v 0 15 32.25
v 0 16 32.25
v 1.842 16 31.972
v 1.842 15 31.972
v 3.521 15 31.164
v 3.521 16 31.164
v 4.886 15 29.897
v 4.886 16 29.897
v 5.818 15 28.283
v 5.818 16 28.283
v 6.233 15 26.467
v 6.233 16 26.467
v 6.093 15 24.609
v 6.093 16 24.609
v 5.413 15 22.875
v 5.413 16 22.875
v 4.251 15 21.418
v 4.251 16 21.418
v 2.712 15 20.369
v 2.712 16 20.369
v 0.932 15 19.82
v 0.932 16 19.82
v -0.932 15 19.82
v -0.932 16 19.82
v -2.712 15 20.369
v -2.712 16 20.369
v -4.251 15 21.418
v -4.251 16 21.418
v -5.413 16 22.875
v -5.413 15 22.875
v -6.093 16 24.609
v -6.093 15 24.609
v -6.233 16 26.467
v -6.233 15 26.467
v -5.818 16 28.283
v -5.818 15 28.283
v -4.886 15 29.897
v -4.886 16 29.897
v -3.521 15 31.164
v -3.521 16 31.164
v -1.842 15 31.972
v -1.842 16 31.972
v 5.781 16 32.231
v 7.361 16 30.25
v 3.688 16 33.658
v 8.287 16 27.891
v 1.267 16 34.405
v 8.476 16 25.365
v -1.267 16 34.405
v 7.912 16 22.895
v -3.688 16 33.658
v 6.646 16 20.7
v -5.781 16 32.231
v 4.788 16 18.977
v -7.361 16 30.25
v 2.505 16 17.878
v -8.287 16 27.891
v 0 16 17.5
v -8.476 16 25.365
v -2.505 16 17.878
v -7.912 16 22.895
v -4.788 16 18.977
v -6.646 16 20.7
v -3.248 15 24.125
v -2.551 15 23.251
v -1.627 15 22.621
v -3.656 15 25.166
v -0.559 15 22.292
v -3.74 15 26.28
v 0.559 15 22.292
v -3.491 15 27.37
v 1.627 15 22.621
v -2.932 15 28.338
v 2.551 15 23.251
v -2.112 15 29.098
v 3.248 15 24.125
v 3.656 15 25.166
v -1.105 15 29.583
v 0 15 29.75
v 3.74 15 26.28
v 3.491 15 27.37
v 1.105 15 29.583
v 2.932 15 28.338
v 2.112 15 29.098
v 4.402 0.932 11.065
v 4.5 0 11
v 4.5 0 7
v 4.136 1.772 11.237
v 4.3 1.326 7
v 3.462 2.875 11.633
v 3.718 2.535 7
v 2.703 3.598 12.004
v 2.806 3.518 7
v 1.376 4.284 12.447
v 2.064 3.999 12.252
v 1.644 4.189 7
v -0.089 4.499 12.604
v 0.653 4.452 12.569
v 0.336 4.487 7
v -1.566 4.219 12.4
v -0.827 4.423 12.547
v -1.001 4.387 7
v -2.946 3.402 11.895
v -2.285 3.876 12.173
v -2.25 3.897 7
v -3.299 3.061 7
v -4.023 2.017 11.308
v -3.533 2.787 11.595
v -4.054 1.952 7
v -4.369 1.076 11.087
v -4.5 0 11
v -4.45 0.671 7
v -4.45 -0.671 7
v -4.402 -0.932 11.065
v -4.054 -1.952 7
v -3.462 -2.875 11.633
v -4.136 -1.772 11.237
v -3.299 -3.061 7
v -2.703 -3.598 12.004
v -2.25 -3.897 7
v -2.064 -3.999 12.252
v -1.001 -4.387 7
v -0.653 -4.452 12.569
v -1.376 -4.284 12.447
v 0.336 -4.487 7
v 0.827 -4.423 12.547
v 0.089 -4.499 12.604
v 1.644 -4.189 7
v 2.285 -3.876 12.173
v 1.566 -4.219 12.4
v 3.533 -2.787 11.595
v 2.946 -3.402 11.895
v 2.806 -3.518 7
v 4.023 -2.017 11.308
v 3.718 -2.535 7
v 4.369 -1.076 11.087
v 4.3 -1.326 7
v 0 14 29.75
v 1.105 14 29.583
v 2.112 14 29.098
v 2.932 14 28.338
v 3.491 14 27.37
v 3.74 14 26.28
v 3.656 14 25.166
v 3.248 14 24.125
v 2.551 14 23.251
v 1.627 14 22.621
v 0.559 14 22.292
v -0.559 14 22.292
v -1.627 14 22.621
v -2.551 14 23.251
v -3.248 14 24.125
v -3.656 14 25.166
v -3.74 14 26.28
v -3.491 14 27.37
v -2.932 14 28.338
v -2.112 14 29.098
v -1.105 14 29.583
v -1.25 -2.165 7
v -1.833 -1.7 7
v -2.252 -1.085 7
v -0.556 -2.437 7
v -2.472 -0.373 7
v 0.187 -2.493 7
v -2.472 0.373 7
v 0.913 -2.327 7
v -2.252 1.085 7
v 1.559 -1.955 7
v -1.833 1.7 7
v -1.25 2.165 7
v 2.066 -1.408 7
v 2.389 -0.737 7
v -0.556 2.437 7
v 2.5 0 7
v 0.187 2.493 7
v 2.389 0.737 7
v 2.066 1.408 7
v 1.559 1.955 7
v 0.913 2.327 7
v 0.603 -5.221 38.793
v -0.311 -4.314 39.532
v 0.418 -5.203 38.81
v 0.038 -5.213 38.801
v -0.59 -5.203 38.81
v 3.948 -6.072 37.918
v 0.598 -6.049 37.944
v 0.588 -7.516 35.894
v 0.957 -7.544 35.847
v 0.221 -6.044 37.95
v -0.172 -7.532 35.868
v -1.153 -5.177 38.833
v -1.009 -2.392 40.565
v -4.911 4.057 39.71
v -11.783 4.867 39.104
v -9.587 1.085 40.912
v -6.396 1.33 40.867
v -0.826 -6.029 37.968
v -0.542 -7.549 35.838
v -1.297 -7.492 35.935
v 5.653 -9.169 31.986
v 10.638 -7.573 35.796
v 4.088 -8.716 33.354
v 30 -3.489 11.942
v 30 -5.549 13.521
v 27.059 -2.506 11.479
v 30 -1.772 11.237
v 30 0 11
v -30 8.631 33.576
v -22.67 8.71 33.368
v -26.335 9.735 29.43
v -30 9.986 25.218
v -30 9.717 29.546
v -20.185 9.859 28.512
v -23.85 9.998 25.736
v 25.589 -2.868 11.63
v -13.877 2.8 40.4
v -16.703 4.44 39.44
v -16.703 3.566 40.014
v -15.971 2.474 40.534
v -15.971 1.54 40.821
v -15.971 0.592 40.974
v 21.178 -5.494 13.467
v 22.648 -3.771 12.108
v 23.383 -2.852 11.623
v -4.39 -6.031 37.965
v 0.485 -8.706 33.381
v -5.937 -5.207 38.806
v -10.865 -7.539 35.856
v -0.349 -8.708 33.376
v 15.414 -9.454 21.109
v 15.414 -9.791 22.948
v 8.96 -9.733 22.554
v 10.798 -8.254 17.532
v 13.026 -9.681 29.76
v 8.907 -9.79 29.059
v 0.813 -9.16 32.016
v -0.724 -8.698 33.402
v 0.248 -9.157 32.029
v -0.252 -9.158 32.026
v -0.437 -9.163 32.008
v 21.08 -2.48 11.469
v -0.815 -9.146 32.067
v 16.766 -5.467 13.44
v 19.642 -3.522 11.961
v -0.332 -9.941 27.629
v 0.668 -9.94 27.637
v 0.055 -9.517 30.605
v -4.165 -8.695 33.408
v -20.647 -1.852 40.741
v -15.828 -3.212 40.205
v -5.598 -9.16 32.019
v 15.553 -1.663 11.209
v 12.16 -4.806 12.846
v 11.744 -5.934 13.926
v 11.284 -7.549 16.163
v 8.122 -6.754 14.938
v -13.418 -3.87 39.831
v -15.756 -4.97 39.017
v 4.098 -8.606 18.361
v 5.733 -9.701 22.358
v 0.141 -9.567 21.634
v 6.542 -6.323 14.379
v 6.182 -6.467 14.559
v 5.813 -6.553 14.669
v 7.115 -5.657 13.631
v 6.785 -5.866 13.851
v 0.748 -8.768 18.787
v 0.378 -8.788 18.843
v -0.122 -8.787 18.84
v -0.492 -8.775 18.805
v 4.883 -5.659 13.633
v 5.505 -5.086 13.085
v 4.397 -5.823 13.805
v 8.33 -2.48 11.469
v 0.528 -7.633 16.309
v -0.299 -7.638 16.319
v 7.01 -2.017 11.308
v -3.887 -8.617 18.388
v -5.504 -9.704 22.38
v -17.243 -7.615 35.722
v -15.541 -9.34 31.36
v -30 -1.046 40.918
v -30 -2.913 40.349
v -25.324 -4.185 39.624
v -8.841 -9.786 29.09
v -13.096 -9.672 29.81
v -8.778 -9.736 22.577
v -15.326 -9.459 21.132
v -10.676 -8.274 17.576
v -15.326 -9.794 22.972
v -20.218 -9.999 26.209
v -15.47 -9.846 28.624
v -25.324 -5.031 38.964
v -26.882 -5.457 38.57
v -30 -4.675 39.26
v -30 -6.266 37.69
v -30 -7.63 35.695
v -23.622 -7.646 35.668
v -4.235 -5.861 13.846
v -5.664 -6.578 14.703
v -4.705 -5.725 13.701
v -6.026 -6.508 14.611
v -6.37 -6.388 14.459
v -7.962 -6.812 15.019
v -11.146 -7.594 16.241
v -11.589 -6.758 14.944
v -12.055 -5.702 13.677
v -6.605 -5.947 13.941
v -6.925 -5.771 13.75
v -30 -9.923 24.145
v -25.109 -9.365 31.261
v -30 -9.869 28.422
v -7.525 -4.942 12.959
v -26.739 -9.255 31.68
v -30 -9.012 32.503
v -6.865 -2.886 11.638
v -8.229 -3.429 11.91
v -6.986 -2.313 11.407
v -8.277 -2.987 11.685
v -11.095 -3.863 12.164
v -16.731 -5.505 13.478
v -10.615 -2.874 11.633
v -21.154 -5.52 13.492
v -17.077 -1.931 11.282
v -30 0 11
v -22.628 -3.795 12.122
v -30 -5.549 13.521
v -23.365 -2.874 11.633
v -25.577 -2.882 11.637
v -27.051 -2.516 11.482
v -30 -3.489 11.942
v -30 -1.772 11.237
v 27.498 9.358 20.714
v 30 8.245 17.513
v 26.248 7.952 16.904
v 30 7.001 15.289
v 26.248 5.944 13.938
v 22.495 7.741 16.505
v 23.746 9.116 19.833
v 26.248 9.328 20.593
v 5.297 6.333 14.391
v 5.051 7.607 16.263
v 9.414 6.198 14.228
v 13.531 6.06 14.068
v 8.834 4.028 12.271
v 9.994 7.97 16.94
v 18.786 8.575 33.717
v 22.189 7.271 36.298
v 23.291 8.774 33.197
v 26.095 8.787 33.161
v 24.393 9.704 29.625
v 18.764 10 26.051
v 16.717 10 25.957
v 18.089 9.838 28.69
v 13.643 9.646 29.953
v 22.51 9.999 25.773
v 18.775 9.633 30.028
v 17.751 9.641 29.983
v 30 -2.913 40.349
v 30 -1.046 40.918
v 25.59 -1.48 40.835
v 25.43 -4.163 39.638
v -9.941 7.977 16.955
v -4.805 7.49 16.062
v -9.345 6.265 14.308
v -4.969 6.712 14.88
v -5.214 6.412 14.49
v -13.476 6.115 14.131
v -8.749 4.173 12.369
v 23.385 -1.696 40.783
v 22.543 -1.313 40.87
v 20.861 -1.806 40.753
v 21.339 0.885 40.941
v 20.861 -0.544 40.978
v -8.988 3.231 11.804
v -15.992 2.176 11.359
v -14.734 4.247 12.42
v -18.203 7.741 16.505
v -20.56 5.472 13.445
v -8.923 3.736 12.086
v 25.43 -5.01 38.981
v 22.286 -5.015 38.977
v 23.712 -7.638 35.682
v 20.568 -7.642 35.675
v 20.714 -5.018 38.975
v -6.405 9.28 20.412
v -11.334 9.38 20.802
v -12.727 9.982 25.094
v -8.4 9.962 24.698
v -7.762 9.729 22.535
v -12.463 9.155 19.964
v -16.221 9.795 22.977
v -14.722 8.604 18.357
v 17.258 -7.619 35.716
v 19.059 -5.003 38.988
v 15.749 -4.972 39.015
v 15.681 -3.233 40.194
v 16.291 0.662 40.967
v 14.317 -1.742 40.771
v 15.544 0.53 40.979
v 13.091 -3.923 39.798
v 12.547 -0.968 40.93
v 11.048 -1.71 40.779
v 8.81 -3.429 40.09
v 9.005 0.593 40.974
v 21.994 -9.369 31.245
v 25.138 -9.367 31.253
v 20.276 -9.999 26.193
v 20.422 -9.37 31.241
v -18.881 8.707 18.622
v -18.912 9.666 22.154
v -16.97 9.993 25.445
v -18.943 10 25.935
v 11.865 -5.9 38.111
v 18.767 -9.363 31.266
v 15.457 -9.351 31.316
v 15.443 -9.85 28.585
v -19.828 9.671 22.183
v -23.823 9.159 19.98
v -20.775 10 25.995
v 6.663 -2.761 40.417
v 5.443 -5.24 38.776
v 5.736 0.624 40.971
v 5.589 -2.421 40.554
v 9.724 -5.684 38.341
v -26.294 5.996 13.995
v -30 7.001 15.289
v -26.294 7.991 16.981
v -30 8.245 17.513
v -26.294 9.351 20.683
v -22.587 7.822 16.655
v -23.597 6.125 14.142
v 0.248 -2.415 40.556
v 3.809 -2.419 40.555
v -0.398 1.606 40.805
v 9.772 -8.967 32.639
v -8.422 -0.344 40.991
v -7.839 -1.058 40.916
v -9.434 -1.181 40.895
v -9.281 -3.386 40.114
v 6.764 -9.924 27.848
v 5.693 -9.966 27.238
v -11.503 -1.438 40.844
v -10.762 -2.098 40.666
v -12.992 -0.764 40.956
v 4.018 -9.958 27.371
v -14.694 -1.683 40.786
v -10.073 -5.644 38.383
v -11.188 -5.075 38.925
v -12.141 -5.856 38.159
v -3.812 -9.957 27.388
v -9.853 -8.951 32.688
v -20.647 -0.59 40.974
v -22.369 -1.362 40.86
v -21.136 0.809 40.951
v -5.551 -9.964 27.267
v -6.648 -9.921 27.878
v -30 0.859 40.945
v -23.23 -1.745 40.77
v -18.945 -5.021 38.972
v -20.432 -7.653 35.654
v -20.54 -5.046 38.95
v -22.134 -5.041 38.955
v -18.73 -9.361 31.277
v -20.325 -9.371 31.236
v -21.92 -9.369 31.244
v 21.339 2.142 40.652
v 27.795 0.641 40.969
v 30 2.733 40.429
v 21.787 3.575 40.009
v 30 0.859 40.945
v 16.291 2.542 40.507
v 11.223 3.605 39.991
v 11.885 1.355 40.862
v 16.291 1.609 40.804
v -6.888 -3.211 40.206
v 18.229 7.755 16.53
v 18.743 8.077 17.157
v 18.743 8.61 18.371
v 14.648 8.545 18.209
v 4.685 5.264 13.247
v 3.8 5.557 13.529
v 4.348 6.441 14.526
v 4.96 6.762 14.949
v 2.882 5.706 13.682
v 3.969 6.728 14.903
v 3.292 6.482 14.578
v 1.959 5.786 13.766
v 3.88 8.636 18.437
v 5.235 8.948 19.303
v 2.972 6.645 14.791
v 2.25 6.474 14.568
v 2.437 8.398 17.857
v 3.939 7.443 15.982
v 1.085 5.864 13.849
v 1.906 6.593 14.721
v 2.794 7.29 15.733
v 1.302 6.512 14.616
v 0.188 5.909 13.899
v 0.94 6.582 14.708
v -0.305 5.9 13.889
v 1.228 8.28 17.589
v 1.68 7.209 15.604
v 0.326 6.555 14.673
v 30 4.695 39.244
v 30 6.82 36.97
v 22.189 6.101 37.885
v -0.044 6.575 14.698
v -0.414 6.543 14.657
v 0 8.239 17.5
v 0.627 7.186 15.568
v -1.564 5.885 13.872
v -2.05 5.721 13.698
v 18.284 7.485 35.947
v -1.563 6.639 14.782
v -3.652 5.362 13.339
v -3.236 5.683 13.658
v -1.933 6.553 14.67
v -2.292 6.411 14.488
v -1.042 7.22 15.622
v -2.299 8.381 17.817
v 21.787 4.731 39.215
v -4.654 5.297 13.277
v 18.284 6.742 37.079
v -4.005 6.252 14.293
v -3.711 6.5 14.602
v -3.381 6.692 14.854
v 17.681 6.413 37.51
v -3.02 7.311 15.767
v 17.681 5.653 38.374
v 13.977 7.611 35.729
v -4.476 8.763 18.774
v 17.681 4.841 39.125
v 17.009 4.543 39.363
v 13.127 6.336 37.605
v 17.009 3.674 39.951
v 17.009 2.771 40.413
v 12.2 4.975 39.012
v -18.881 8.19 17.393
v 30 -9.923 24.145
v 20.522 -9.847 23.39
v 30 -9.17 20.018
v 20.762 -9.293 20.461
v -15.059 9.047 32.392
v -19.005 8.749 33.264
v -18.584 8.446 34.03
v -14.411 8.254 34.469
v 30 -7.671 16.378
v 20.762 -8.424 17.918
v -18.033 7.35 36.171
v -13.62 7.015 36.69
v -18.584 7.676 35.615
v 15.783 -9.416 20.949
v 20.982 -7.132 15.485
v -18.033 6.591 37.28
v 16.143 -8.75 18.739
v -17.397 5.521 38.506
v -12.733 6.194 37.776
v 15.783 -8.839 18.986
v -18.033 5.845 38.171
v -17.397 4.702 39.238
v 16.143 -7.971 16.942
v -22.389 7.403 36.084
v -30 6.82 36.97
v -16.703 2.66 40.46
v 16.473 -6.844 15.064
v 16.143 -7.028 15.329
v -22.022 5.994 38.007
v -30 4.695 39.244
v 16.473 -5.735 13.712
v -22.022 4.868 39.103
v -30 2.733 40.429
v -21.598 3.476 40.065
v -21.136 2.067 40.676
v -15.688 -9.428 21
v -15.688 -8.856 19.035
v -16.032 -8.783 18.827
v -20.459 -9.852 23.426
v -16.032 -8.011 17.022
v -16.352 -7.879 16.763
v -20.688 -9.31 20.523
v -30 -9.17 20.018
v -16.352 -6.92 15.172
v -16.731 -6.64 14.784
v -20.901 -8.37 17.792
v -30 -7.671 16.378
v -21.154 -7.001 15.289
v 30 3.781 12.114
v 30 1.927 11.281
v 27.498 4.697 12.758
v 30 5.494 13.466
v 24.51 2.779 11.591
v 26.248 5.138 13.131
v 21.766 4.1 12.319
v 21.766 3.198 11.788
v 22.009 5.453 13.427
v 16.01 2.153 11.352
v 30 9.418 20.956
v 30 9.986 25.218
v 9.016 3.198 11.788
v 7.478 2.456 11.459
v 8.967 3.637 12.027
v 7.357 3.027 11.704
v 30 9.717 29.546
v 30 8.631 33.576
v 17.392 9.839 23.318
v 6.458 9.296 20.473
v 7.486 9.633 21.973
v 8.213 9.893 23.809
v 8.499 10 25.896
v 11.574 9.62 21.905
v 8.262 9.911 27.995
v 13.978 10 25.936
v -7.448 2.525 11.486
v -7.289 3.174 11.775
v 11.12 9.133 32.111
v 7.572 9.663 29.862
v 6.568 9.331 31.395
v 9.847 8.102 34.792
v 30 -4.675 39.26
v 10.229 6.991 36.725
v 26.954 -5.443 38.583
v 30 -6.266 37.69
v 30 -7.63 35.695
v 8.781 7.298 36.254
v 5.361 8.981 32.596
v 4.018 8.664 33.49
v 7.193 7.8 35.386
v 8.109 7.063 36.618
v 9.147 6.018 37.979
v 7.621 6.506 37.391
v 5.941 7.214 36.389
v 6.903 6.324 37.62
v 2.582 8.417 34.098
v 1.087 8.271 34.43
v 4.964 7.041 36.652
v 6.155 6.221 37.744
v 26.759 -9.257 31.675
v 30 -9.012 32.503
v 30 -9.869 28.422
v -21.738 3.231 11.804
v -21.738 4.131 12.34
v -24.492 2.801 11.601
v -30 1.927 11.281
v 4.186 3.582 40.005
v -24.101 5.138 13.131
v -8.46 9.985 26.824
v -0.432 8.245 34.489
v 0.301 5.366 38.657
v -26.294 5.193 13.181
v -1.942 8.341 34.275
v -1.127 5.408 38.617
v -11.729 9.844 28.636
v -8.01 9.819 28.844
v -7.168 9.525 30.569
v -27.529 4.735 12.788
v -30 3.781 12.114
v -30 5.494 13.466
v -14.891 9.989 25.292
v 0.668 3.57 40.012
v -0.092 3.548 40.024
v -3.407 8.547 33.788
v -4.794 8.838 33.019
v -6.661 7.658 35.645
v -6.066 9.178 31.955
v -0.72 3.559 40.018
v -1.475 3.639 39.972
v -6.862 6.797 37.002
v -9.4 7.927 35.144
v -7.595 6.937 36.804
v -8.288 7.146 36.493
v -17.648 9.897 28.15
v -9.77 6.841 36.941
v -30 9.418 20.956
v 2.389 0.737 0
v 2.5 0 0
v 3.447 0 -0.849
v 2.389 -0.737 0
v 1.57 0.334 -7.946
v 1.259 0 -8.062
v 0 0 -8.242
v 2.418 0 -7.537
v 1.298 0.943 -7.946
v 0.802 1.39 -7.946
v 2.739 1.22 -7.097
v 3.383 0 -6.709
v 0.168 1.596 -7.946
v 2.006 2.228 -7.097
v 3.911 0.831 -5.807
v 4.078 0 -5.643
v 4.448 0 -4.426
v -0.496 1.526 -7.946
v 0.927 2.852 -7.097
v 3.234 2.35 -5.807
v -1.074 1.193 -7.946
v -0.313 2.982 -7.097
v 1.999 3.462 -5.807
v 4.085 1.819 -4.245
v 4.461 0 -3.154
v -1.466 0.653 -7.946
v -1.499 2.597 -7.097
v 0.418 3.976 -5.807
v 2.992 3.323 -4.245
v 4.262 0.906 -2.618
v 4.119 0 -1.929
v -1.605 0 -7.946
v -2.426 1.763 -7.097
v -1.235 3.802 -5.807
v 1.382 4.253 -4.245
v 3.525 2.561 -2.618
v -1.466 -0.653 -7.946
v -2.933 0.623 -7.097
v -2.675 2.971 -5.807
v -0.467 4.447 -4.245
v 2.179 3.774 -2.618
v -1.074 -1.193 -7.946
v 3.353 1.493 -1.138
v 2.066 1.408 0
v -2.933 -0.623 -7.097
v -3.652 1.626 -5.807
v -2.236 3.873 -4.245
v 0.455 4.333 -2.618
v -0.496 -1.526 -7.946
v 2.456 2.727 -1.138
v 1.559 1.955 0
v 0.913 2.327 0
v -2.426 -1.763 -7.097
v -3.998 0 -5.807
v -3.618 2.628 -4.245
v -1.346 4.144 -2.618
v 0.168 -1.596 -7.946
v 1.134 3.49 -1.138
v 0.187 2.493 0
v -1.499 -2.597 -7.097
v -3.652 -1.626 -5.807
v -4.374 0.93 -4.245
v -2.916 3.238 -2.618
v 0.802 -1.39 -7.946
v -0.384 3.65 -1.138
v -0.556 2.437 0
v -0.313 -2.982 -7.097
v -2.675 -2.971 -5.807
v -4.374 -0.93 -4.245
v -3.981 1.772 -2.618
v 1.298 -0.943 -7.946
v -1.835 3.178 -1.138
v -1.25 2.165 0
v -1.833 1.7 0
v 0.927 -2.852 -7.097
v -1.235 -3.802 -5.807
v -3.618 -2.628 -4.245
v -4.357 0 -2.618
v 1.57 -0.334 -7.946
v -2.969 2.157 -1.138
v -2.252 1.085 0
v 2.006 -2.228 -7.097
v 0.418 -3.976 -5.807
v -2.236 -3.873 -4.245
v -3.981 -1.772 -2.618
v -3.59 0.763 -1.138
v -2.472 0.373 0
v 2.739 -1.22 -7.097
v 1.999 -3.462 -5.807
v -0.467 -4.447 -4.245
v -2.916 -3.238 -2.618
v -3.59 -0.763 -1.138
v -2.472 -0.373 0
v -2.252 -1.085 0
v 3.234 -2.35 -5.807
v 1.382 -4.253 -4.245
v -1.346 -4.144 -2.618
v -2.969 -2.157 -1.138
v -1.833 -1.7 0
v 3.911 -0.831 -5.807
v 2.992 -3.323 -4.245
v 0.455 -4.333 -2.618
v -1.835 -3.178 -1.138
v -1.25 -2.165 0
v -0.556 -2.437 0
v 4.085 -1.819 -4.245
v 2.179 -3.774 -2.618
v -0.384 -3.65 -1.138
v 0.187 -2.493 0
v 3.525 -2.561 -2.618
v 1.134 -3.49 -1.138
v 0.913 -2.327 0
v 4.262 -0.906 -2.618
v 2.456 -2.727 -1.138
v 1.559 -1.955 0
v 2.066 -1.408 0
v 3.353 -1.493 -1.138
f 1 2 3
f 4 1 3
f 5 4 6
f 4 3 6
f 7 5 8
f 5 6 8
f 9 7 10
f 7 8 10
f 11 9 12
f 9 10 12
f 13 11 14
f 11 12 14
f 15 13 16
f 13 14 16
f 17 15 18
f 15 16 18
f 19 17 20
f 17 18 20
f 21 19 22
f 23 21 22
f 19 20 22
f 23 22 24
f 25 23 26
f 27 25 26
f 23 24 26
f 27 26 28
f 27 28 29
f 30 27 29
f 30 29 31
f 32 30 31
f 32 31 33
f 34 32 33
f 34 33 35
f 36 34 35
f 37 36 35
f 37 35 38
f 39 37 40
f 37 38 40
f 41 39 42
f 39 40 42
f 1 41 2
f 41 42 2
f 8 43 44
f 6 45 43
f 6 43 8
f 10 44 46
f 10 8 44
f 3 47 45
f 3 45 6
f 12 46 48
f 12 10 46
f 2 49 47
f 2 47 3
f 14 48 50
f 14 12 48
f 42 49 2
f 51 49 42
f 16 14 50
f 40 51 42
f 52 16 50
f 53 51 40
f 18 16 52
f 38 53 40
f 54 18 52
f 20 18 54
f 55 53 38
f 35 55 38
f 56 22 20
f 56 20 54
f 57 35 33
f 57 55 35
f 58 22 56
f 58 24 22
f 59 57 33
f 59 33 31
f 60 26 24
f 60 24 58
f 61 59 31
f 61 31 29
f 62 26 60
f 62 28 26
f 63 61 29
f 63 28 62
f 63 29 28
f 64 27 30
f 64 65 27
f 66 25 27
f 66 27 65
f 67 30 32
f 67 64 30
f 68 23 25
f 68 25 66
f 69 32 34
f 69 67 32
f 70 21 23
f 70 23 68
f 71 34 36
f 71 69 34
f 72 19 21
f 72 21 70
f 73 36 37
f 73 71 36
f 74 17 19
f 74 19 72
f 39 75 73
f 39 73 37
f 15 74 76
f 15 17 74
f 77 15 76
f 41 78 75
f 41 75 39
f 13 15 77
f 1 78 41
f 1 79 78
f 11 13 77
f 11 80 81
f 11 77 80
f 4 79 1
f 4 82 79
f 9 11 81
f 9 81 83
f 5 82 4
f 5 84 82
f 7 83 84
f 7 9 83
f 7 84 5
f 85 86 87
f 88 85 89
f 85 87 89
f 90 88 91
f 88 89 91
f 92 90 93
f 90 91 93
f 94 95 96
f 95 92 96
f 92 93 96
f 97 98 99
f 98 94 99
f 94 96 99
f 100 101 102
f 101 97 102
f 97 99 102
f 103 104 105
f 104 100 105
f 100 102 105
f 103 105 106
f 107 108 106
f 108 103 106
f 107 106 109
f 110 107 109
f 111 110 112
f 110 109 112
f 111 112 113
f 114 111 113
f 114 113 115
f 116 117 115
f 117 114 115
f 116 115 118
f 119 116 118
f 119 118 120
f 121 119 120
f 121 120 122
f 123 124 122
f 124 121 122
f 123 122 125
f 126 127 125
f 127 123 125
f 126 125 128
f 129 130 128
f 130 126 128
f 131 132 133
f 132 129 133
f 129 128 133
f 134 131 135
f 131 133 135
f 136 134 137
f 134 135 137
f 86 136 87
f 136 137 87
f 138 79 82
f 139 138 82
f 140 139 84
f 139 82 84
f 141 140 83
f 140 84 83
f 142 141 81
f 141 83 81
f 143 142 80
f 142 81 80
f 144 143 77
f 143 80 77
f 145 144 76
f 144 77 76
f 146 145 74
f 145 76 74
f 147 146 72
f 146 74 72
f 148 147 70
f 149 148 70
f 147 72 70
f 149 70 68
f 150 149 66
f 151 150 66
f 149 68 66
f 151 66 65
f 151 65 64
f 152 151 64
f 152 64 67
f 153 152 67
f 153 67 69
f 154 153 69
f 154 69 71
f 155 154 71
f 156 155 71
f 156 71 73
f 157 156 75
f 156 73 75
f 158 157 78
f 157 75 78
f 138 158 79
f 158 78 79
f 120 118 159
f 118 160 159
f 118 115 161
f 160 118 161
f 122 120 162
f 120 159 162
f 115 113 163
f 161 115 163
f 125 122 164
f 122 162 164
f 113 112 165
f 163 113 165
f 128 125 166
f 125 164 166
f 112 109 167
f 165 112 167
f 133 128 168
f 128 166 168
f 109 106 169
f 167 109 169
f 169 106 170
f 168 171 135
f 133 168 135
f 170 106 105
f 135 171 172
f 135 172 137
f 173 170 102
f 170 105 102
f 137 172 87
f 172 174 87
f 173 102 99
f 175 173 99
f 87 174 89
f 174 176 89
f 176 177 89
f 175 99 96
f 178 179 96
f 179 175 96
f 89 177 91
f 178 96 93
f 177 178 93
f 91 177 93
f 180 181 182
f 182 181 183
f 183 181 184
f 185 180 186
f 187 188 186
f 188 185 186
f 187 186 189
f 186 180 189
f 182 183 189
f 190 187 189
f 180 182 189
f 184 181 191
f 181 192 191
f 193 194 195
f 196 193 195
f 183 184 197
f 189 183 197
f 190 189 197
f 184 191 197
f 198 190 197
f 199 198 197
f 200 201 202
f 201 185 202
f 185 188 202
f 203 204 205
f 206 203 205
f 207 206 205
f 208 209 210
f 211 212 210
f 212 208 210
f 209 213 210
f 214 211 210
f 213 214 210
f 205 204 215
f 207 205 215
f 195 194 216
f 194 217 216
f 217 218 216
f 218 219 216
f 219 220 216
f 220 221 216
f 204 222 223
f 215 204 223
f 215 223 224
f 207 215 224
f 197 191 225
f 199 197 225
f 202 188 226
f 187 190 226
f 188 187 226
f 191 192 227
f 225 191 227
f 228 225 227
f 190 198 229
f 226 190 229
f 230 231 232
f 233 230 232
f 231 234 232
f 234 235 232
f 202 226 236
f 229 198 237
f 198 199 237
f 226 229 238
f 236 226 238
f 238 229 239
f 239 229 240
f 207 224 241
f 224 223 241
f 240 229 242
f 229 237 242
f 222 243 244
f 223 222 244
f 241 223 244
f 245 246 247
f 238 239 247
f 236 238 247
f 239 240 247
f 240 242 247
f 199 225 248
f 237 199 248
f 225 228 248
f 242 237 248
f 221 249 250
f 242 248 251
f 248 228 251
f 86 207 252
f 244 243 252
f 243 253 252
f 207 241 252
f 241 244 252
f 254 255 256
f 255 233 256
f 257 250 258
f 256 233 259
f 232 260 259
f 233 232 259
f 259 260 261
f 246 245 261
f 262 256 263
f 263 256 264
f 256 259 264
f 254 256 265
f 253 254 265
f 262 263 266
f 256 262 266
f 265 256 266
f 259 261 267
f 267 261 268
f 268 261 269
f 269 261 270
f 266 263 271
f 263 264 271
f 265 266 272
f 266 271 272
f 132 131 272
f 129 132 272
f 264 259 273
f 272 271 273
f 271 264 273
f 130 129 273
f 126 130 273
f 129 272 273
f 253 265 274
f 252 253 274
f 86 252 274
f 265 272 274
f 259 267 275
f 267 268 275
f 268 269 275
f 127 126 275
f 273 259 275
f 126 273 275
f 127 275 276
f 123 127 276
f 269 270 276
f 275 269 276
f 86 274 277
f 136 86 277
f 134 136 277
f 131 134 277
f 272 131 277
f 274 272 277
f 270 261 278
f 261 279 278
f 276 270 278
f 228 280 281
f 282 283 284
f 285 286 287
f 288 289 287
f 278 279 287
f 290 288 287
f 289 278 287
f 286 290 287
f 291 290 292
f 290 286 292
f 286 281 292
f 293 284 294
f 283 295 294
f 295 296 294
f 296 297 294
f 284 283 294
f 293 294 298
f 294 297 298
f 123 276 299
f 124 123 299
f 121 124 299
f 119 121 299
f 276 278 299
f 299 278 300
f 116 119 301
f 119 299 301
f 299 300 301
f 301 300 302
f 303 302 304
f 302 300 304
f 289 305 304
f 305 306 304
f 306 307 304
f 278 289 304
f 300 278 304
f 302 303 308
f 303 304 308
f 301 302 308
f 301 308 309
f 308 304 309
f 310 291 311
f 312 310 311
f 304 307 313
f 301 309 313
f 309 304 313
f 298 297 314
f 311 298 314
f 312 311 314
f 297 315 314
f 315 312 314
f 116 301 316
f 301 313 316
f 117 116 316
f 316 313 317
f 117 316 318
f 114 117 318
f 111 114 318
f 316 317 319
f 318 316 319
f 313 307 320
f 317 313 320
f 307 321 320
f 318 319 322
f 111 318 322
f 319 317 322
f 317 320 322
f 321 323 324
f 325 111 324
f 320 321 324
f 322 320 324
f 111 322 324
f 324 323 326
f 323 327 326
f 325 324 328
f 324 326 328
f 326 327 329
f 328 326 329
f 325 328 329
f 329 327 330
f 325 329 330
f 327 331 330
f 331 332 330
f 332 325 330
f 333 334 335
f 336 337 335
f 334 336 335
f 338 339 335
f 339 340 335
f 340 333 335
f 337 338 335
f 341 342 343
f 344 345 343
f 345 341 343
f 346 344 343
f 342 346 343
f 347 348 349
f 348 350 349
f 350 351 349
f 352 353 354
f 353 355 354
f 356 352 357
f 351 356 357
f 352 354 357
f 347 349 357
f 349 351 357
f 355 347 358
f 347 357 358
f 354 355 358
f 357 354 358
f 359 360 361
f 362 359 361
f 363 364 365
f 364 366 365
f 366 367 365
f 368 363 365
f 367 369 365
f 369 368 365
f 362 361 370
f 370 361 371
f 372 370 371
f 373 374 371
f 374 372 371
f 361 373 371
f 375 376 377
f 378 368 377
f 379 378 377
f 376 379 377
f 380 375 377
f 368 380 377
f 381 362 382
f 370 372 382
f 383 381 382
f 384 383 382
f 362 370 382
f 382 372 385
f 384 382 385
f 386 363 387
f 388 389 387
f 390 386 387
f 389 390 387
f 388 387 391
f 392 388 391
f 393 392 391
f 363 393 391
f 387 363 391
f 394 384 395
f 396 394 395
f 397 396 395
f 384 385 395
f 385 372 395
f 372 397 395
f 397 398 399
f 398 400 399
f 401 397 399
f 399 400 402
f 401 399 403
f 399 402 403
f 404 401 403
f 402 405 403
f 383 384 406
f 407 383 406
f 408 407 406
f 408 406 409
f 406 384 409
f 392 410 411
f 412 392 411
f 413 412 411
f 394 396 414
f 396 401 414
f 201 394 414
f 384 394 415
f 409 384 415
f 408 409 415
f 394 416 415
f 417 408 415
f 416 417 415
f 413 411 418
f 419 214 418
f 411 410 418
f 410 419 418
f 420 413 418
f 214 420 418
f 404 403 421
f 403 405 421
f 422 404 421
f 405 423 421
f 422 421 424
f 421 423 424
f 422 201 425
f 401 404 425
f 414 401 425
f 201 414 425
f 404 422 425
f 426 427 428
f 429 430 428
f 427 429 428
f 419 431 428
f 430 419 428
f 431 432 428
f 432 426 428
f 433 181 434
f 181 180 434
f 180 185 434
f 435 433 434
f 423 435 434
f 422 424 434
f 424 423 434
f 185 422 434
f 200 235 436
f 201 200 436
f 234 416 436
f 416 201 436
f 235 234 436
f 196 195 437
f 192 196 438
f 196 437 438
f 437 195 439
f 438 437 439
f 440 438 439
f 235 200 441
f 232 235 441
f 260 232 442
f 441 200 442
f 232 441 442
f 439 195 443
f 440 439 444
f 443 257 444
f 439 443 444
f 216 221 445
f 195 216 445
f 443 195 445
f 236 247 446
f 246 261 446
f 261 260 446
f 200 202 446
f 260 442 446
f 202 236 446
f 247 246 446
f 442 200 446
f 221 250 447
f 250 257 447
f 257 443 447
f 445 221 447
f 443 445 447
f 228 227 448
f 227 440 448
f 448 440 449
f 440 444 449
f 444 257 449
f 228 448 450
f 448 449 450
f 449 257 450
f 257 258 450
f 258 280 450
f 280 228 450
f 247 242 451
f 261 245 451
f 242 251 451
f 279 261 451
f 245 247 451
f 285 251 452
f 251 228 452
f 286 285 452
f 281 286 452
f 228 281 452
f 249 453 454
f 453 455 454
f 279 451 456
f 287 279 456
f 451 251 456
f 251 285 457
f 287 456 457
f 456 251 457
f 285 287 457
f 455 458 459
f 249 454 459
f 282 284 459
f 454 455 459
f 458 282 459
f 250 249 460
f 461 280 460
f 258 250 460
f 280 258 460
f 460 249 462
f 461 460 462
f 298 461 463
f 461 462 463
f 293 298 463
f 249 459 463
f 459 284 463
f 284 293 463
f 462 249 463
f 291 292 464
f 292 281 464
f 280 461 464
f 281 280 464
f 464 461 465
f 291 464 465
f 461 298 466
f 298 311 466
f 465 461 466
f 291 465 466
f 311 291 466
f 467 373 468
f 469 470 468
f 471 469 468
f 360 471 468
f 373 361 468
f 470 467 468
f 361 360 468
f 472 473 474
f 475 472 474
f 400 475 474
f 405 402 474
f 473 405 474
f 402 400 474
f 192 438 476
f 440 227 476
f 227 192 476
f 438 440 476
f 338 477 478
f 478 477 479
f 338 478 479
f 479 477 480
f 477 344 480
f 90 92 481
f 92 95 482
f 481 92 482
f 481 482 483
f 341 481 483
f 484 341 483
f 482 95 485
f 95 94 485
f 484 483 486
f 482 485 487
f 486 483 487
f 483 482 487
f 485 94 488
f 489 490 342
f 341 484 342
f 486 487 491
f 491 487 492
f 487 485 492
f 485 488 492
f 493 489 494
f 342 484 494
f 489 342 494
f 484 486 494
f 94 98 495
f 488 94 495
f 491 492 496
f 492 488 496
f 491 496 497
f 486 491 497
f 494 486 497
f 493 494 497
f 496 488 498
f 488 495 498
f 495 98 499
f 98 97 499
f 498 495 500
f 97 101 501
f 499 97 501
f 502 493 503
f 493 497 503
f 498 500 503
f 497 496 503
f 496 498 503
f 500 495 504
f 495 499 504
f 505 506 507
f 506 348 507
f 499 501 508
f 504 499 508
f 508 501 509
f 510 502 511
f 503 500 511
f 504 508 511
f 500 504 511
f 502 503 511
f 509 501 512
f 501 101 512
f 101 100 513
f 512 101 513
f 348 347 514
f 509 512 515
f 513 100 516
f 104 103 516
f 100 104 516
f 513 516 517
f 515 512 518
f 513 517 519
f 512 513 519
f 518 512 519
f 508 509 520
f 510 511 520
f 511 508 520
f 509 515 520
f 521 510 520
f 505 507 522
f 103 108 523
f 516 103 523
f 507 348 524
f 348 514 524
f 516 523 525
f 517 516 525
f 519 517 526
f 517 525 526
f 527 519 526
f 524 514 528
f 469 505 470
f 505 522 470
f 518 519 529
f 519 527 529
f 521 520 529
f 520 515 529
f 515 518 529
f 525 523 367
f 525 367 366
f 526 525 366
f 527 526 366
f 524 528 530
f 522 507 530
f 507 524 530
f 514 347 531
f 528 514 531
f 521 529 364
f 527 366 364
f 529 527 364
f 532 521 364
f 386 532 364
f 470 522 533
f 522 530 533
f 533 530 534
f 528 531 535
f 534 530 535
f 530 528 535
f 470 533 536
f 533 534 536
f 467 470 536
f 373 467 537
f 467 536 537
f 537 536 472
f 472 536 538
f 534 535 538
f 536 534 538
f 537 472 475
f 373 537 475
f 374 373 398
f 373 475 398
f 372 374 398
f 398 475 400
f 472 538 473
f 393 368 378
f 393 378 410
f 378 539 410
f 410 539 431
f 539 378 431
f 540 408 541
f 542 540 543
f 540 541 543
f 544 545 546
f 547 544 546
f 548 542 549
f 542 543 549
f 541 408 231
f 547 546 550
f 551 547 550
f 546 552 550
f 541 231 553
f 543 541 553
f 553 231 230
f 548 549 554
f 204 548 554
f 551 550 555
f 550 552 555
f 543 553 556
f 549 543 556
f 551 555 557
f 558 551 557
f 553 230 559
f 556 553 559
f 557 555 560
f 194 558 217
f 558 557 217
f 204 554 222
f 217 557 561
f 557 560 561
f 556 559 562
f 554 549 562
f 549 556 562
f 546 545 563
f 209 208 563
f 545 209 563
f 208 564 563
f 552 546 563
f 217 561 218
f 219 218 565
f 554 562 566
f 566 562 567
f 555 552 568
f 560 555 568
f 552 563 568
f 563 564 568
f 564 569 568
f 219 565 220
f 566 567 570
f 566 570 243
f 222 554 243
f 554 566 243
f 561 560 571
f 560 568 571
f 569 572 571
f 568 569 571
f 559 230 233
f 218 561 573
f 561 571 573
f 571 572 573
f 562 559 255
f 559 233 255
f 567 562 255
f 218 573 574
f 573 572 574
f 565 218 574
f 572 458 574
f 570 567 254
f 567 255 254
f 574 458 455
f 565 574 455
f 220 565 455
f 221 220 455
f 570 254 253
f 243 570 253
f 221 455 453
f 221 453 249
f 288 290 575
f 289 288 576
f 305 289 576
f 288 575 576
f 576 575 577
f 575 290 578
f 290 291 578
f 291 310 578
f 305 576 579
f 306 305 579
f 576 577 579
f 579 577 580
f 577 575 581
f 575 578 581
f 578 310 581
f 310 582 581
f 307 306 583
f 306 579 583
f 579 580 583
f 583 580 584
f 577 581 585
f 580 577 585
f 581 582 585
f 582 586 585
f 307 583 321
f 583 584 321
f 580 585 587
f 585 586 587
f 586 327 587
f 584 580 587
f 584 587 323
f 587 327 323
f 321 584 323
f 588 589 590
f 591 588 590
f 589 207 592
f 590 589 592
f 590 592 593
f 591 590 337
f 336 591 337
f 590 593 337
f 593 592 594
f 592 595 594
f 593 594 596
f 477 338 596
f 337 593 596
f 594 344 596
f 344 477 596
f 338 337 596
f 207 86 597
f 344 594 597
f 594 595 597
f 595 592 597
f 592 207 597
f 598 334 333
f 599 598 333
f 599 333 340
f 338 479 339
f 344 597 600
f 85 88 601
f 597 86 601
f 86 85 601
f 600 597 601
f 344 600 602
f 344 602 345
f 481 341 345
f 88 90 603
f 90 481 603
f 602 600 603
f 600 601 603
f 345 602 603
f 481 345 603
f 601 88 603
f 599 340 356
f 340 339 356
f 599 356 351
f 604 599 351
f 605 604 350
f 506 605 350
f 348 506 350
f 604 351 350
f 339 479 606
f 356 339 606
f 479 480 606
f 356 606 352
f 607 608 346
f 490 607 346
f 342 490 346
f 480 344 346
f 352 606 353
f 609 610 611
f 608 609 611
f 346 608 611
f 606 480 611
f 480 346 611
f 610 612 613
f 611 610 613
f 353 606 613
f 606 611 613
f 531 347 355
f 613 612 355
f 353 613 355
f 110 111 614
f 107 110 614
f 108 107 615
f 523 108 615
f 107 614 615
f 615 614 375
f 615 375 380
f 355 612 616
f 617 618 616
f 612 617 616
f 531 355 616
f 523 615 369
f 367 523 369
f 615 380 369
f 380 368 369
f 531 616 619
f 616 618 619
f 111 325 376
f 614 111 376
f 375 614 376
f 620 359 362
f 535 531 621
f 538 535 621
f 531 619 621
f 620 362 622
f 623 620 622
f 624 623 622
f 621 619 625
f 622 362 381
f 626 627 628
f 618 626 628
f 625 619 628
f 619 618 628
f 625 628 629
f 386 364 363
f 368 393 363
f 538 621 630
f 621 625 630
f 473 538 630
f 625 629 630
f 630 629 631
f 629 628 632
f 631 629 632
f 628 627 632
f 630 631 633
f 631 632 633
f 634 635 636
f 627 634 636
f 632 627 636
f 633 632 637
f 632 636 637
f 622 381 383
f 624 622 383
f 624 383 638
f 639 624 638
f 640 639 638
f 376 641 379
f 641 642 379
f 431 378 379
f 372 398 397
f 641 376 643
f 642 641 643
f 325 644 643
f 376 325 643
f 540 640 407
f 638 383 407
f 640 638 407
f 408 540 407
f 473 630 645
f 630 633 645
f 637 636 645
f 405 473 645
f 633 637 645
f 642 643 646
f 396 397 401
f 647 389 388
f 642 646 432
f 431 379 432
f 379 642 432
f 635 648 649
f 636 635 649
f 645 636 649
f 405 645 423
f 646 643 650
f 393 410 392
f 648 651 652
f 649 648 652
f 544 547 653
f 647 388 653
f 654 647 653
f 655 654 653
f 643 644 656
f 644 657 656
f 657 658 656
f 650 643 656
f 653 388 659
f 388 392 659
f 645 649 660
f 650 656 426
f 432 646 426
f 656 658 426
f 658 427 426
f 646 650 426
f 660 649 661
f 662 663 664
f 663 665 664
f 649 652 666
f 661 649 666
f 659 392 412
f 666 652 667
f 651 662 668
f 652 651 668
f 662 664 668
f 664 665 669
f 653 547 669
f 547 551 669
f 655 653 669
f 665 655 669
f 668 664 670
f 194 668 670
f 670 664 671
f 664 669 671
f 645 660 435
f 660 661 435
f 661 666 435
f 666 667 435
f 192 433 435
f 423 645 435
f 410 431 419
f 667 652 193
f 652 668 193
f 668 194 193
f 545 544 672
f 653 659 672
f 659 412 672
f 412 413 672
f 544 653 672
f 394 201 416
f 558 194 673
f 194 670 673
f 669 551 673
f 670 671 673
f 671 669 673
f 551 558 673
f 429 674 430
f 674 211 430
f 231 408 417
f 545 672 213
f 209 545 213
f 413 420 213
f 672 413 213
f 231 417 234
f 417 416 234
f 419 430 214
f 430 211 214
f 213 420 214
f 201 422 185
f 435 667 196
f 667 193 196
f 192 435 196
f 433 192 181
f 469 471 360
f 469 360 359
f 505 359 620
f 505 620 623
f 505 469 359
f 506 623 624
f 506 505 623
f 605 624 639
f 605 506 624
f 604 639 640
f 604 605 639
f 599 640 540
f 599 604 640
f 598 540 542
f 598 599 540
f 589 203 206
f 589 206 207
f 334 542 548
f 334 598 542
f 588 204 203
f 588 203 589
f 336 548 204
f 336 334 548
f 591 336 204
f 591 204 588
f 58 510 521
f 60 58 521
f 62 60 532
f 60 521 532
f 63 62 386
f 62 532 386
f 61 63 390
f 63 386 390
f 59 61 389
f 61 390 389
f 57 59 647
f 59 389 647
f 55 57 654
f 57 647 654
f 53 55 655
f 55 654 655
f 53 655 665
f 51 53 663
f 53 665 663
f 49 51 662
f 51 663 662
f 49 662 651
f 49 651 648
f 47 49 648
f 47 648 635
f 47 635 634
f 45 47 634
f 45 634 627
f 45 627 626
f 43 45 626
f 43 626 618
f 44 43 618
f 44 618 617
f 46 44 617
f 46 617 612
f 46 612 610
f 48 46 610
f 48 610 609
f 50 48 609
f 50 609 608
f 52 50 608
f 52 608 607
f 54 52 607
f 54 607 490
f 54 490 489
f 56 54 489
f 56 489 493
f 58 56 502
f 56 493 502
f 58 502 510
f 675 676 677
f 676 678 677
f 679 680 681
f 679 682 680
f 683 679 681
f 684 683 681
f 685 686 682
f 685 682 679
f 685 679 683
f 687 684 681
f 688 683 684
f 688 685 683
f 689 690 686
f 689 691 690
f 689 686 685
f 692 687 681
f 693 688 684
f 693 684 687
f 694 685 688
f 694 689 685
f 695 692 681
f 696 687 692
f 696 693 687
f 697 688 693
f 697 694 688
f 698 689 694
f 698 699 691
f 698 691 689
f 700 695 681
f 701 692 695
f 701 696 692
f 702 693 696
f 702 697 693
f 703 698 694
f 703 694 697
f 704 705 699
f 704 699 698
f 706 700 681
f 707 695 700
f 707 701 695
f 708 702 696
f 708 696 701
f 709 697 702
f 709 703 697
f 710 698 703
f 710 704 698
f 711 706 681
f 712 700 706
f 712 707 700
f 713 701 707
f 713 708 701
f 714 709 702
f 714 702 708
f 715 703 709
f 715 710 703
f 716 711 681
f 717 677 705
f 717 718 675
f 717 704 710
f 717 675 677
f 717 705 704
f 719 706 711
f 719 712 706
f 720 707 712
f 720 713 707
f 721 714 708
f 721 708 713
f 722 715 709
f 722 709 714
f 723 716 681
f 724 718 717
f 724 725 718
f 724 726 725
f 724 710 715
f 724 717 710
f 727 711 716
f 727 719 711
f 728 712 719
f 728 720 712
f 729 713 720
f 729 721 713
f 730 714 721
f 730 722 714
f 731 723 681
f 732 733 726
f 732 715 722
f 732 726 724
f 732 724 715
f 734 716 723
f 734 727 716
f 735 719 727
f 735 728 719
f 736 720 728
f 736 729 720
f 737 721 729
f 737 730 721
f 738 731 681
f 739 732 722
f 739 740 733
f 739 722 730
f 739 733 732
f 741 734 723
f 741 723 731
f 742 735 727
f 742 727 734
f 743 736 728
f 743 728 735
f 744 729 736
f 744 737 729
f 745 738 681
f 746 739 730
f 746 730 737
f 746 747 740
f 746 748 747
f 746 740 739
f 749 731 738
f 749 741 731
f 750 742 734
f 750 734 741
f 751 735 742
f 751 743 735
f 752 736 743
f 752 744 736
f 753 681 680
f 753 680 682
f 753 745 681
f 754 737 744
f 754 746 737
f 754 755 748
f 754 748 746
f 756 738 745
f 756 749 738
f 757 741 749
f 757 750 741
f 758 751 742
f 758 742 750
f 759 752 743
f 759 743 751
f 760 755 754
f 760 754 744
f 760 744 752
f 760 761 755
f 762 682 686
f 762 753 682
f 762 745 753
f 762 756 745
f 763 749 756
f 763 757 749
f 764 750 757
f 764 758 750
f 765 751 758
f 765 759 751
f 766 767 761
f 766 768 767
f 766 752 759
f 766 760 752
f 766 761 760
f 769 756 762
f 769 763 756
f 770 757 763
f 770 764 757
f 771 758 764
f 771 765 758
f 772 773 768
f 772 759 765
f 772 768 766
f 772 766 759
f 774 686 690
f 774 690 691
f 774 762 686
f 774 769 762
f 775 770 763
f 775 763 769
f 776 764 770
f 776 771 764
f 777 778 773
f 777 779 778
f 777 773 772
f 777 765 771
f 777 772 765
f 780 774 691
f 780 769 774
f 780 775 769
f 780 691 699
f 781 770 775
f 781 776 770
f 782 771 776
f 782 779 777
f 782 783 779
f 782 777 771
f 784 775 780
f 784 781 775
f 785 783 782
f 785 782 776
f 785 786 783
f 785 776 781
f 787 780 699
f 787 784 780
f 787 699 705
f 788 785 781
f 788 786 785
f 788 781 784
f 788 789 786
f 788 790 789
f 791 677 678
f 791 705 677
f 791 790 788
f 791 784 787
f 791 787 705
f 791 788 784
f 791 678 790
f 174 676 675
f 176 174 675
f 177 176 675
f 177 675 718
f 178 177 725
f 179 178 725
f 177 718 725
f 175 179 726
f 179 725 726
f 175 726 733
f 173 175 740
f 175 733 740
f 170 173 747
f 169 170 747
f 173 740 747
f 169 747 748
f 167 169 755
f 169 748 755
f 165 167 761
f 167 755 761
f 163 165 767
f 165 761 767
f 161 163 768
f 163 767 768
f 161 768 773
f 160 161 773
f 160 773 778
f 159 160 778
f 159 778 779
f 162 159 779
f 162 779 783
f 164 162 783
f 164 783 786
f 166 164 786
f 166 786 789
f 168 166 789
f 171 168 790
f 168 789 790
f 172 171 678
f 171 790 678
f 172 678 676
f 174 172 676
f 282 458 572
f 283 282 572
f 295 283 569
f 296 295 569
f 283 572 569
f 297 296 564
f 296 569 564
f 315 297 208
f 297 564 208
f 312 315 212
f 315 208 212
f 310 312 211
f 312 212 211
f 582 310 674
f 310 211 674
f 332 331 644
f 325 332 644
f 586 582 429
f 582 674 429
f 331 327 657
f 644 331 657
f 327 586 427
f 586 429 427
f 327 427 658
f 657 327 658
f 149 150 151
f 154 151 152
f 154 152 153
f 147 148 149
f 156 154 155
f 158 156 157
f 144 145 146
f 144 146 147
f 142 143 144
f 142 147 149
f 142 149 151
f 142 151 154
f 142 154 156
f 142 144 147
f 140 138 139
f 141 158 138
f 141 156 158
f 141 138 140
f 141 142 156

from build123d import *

# Parameters (mm, degrees)
SKETCH_1_R           = 2.5
EXTRUDE_1_DEPTH      = 7
SKETCH_2_R           = 4.5
EXTRUDE_2_DEPTH      = 10
EXTRUDE_3_DEPTH      = 30
EXTRUDE_3_DEPTH_BACK = 30
SKETCH_3_RX          = 15
SKETCH_3_RY          = 10
SKETCH_4_R           = 8.5
EXTRUDE_4_DEPTH      = 16
SKETCH_5_R           = 6.25
CUT_EXTRUDE_1_DEPTH  = 1
SKETCH_6_R           = 3.75
CUT_EXTRUDE_2_DEPTH  = 1


with BuildPart() as part:
    # 草图1 → 凸台-拉伸1 (new body)
    with BuildSketch(Plane.XY):
        Circle(SKETCH_1_R)
    extrude(amount=EXTRUDE_1_DEPTH)

    # 草图2 → 凸台-拉伸2 (add)
    with BuildSketch(Plane.XY.offset(7)):
        Circle(SKETCH_2_R)
    extrude(amount=EXTRUDE_2_DEPTH)

    # 草图3 → 凸台-拉伸3 (add, two sides: drawn at the far end of the back side and taken through both)
    with BuildSketch(Plane(origin=(0, 0, 0), x_dir=(0, 0, -1), z_dir=(1, 0, 0)).offset(-EXTRUDE_3_DEPTH_BACK)):
        with Locations((-26, 0)):
            Ellipse(SKETCH_3_RX, SKETCH_3_RY)
    extrude(amount=EXTRUDE_3_DEPTH + EXTRUDE_3_DEPTH_BACK)

    # 草图4 → 凸台-拉伸4 (add)
    with BuildSketch(Plane(origin=(0, 0, 0), x_dir=(1, 0, 0), z_dir=(0, 1, 0))):
        with Locations((0, -26)):
            Circle(SKETCH_4_R)
    extrude(amount=EXTRUDE_4_DEPTH)

    # 草图5 → 切除-拉伸1 (cut)
    with BuildSketch(Plane(origin=(0, 16, 0), x_dir=(1, 0, 0), z_dir=(0, 1, 0))):
        with Locations((0, -26)):
            Circle(SKETCH_5_R)
    extrude(amount=-CUT_EXTRUDE_1_DEPTH, mode=Mode.SUBTRACT)

    # 草图6 → 切除-拉伸2 (cut)
    with BuildSketch(Plane(origin=(0, 15, 0), x_dir=(1, 0, 0), z_dir=(0, 1, 0))):
        with Locations((0, -26)):
            Circle(SKETCH_6_R)
    extrude(amount=-CUT_EXTRUDE_2_DEPTH, mode=Mode.SUBTRACT)

    # 草图7 → 旋转3 (revolve)
    with BuildSketch(Plane(origin=(0, 0, 0), x_dir=(1, 0, 0), z_dir=(0, 1, 0))):
        with BuildLine():
            Line((0, -0.758342613), (0, 8.241657387))
            ThreePointArc((0, 8.241657387), (4.5, 3.741657387), (0, -0.758342613))
        make_face()
    revolve(axis=Axis((0, 0, -10.703740256), (0, 0, 1)))


solid = part.part
